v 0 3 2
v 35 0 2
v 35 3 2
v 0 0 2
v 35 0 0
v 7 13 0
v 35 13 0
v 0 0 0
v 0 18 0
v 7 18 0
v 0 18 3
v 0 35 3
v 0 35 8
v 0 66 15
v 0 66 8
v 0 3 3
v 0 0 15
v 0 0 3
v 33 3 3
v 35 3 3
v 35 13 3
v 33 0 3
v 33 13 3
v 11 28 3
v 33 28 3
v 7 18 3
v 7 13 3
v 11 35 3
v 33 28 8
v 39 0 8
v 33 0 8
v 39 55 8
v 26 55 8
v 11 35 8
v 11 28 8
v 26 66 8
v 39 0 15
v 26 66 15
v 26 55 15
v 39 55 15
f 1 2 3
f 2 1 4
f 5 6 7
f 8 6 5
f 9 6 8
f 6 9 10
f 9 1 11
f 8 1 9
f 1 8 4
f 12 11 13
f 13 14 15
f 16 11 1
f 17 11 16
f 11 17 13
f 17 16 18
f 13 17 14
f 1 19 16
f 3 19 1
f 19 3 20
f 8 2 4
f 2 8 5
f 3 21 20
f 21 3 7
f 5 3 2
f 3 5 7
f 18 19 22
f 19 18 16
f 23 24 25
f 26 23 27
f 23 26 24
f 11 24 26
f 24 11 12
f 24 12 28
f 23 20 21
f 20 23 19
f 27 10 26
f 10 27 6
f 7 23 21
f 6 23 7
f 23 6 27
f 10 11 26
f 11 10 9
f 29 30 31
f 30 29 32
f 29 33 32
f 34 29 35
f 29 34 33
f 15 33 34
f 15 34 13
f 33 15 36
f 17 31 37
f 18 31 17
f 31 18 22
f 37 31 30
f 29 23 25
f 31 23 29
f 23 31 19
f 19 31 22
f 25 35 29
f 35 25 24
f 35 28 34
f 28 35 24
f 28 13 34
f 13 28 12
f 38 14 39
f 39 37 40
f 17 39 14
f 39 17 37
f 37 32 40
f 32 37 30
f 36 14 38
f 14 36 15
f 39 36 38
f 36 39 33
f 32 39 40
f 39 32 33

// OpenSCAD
translate([2.5, 1.5, 1.0]) color([0.8774574539285279, 0.35307108172351365, 0.4582943249787391]) cube([5, 3, 2], center=true);
translate([7.5, 1.5, 1.0]) color([0.6318794317305464, 0.5161242981674495, 0.9564683485665337]) cube([5, 3, 2], center=true);
translate([12.5, 1.5, 1.0]) color([0.9547176774381221, 0.9297598506094263, 0.9340763496652581]) cube([5, 3, 2], center=true);
translate([17.5, 1.5, 1.0]) color([0.580960135568696, 0.49020206373000297, 0.7041168173823689]) cube([5, 3, 2], center=true);
translate([22.5, 1.5, 1.0]) color([0.21541959298546798, 0.26587203921552827, 0.04380725363309168]) cube([5, 3, 2], center=true);
translate([27.5, 1.5, 1.0]) color([0.16285754255803098, 0.0038745499388105342, 0.6546275765234981]) cube([5, 3, 2], center=true);
translate([32.5, 1.5, 1.0]) color([0.14040698903568194, 0.7866793455760521, 0.680503995881725]) cube([5, 3, 2], center=true);
translate([3.5, 5.5, 1.5]) color([0.9706757933544957, 0.3965144869518913, 0.9213919134510528]) cube([7, 5, 3], center=true);
translate([10.5, 5.5, 1.5]) color([0.4537041723195332, 0.3395037398362071, 0.10233886991705377]) cube([7, 5, 3], center=true);
translate([17.5, 5.5, 1.5]) color([0.8828321850718597, 0.7947901585625868, 0.3229289765350606]) cube([7, 5, 3], center=true);
translate([24.5, 5.5, 1.5]) color([0.45574438492562896, 0.32514346581324827, 0.028829116538094723]) cube([7, 5, 3], center=true);
translate([31.5, 5.5, 1.5]) color([0.04435252539911694, 0.3687041258820589, 0.20959132812878367]) cube([7, 5, 3], center=true);
translate([3.5, 10.5, 1.5]) color([0.5245146032105923, 0.1877850356496189, 0.2016215864664097]) cube([7, 5, 3], center=true);
translate([10.5, 10.5, 1.5]) color([0.6726678813176303, 0.7356026567617159, 0.31223209587410494]) cube([7, 5, 3], center=true);
translate([17.5, 10.5, 1.5]) color([0.8599943994333726, 0.2546391746557106, 0.34394037628155716]) cube([7, 5, 3], center=true);
translate([24.5, 10.5, 1.5]) color([0.712480390369609, 0.04450290132920964, 0.934183460116191]) cube([7, 5, 3], center=true);
translate([31.5, 10.5, 1.5]) color([0.07233773178762537, 0.4609310589380602, 0.7246048259600892]) cube([7, 5, 3], center=true);
translate([3.5, 15.5, 1.5]) color([0.04746853498479808, 0.8090026856371774, 0.9788933433114139]) cube([7, 5, 3], center=true);
translate([5.5, 3.5, 5.5]) color([0.460511672795628, 0.11812363628756806, 0.08147699565547994]) cube([11, 7, 5], center=true);
translate([16.5, 3.5, 5.5]) color([0.09873043616313526, 0.7654413741364753, 0.4140128484685186]) cube([11, 7, 5], center=true);
translate([27.5, 3.5, 5.5]) color([0.9192341581990311, 0.4406397760864845, 0.07714331014460807]) cube([11, 7, 5], center=true);
translate([5.5, 10.5, 5.5]) color([0.42693558751800065, 0.7548278934255565, 0.8293384268467949]) cube([11, 7, 5], center=true);
translate([16.5, 10.5, 5.5]) color([0.039351686529191854, 0.1803893912563338, 0.490013452023644]) cube([11, 7, 5], center=true);
translate([27.5, 10.5, 5.5]) color([0.12808547795160863, 0.8710926419421733, 0.9344608884461488]) cube([11, 7, 5], center=true);
translate([5.5, 17.5, 5.5]) color([0.3195969983538176, 0.43484368255202, 0.5570540644200566]) cube([11, 7, 5], center=true);
translate([16.5, 17.5, 5.5]) color([0.2855057910835891, 0.5410756974595614, 0.2011850454737838]) cube([11, 7, 5], center=true);
translate([27.5, 17.5, 5.5]) color([0.2966412512769129, 0.44178363318767744, 0.604669902191143]) cube([11, 7, 5], center=true);
translate([5.5, 24.5, 5.5]) color([0.5361650260862432, 0.2609879767339395, 0.23178787541805523]) cube([11, 7, 5], center=true);
translate([16.5, 24.5, 5.5]) color([0.11873023670071103, 0.7834936358921726, 0.09890076646638046]) cube([11, 7, 5], center=true);
translate([27.5, 24.5, 5.5]) color([0.7328850061793606, 0.2487736956630997, 0.28455698400578255]) cube([11, 7, 5], center=true);
translate([5.5, 31.5, 5.5]) color([0.7360834330107994, 0.6596207917216363, 0.7419215555155583]) cube([11, 7, 5], center=true);
translate([6.5, 5.5, 11.5]) color([0.5152830587943614, 0.8590958196652707, 0.12179389137547159]) cube([13, 11, 7], center=true);
translate([19.5, 5.5, 11.5]) color([0.6451969614065052, 0.11824431248865597, 0.7372833681454282]) cube([13, 11, 7], center=true);
translate([6.5, 16.5, 11.5]) color([0.3589046614584527, 0.67488210437111, 0.7034839134412817]) cube([13, 11, 7], center=true);
translate([19.5, 16.5, 11.5]) color([0.6606084576410584, 0.22155798032782648, 0.8317998863873537]) cube([13, 11, 7], center=true);
translate([6.5, 27.5, 11.5]) color([0.24013608742346748, 0.5181532972121122, 0.6746457541533513]) cube([13, 11, 7], center=true);
translate([19.5, 27.5, 11.5]) color([0.23360317478475656, 0.628511722983939, 0.2868310479973286]) cube([13, 11, 7], center=true);
translate([6.5, 38.5, 11.5]) color([0.1713823760843869, 0.809748828526577, 0.5531227700773604]) cube([13, 11, 7], center=true);
translate([19.5, 38.5, 11.5]) color([0.32788470660885605, 0.5854309472055399, 0.025286397427288332]) cube([13, 11, 7], center=true);
translate([32.5, 5.5, 11.5]) color([0.12982285676032723, 0.3955808516982431, 0.9757565794644123]) cube([13, 11, 7], center=true);
translate([32.5, 16.5, 11.5]) color([0.5104745178761232, 0.07645620506689521, 0.7650406152494567]) cube([13, 11, 7], center=true);
translate([32.5, 27.5, 11.5]) color([0.7814438709253152, 0.7748021743948562, 0.5694980380479538]) cube([13, 11, 7], center=true);
translate([32.5, 38.5, 11.5]) color([0.6956987378694627, 0.21345793631163135, 0.7325605908939883]) cube([13, 11, 7], center=true);
translate([6.5, 49.5, 11.5]) color([0.8161739873415944, 0.7599665402219192, 0.353462402585887]) cube([13, 11, 7], center=true);
translate([19.5, 49.5, 11.5]) color([0.5910280505757086, 0.6289893574898388, 0.9008098536570839]) cube([13, 11, 7], center=true);
translate([6.5, 60.5, 11.5]) color([0.1080138952733335, 0.8339337708504084, 0.5264355584690392]) cube([13, 11, 7], center=true);
translate([19.5, 60.5, 11.5]) color([0.3586141205519373, 0.4556029014937524, 0.012635498930738787]) cube([13, 11, 7], center=true);
translate([32.5, 49.5, 11.5]) color([0.22007359233142765, 0.6527634200680049, 0.660849279754449]) cube([13, 11, 7], center=true);
